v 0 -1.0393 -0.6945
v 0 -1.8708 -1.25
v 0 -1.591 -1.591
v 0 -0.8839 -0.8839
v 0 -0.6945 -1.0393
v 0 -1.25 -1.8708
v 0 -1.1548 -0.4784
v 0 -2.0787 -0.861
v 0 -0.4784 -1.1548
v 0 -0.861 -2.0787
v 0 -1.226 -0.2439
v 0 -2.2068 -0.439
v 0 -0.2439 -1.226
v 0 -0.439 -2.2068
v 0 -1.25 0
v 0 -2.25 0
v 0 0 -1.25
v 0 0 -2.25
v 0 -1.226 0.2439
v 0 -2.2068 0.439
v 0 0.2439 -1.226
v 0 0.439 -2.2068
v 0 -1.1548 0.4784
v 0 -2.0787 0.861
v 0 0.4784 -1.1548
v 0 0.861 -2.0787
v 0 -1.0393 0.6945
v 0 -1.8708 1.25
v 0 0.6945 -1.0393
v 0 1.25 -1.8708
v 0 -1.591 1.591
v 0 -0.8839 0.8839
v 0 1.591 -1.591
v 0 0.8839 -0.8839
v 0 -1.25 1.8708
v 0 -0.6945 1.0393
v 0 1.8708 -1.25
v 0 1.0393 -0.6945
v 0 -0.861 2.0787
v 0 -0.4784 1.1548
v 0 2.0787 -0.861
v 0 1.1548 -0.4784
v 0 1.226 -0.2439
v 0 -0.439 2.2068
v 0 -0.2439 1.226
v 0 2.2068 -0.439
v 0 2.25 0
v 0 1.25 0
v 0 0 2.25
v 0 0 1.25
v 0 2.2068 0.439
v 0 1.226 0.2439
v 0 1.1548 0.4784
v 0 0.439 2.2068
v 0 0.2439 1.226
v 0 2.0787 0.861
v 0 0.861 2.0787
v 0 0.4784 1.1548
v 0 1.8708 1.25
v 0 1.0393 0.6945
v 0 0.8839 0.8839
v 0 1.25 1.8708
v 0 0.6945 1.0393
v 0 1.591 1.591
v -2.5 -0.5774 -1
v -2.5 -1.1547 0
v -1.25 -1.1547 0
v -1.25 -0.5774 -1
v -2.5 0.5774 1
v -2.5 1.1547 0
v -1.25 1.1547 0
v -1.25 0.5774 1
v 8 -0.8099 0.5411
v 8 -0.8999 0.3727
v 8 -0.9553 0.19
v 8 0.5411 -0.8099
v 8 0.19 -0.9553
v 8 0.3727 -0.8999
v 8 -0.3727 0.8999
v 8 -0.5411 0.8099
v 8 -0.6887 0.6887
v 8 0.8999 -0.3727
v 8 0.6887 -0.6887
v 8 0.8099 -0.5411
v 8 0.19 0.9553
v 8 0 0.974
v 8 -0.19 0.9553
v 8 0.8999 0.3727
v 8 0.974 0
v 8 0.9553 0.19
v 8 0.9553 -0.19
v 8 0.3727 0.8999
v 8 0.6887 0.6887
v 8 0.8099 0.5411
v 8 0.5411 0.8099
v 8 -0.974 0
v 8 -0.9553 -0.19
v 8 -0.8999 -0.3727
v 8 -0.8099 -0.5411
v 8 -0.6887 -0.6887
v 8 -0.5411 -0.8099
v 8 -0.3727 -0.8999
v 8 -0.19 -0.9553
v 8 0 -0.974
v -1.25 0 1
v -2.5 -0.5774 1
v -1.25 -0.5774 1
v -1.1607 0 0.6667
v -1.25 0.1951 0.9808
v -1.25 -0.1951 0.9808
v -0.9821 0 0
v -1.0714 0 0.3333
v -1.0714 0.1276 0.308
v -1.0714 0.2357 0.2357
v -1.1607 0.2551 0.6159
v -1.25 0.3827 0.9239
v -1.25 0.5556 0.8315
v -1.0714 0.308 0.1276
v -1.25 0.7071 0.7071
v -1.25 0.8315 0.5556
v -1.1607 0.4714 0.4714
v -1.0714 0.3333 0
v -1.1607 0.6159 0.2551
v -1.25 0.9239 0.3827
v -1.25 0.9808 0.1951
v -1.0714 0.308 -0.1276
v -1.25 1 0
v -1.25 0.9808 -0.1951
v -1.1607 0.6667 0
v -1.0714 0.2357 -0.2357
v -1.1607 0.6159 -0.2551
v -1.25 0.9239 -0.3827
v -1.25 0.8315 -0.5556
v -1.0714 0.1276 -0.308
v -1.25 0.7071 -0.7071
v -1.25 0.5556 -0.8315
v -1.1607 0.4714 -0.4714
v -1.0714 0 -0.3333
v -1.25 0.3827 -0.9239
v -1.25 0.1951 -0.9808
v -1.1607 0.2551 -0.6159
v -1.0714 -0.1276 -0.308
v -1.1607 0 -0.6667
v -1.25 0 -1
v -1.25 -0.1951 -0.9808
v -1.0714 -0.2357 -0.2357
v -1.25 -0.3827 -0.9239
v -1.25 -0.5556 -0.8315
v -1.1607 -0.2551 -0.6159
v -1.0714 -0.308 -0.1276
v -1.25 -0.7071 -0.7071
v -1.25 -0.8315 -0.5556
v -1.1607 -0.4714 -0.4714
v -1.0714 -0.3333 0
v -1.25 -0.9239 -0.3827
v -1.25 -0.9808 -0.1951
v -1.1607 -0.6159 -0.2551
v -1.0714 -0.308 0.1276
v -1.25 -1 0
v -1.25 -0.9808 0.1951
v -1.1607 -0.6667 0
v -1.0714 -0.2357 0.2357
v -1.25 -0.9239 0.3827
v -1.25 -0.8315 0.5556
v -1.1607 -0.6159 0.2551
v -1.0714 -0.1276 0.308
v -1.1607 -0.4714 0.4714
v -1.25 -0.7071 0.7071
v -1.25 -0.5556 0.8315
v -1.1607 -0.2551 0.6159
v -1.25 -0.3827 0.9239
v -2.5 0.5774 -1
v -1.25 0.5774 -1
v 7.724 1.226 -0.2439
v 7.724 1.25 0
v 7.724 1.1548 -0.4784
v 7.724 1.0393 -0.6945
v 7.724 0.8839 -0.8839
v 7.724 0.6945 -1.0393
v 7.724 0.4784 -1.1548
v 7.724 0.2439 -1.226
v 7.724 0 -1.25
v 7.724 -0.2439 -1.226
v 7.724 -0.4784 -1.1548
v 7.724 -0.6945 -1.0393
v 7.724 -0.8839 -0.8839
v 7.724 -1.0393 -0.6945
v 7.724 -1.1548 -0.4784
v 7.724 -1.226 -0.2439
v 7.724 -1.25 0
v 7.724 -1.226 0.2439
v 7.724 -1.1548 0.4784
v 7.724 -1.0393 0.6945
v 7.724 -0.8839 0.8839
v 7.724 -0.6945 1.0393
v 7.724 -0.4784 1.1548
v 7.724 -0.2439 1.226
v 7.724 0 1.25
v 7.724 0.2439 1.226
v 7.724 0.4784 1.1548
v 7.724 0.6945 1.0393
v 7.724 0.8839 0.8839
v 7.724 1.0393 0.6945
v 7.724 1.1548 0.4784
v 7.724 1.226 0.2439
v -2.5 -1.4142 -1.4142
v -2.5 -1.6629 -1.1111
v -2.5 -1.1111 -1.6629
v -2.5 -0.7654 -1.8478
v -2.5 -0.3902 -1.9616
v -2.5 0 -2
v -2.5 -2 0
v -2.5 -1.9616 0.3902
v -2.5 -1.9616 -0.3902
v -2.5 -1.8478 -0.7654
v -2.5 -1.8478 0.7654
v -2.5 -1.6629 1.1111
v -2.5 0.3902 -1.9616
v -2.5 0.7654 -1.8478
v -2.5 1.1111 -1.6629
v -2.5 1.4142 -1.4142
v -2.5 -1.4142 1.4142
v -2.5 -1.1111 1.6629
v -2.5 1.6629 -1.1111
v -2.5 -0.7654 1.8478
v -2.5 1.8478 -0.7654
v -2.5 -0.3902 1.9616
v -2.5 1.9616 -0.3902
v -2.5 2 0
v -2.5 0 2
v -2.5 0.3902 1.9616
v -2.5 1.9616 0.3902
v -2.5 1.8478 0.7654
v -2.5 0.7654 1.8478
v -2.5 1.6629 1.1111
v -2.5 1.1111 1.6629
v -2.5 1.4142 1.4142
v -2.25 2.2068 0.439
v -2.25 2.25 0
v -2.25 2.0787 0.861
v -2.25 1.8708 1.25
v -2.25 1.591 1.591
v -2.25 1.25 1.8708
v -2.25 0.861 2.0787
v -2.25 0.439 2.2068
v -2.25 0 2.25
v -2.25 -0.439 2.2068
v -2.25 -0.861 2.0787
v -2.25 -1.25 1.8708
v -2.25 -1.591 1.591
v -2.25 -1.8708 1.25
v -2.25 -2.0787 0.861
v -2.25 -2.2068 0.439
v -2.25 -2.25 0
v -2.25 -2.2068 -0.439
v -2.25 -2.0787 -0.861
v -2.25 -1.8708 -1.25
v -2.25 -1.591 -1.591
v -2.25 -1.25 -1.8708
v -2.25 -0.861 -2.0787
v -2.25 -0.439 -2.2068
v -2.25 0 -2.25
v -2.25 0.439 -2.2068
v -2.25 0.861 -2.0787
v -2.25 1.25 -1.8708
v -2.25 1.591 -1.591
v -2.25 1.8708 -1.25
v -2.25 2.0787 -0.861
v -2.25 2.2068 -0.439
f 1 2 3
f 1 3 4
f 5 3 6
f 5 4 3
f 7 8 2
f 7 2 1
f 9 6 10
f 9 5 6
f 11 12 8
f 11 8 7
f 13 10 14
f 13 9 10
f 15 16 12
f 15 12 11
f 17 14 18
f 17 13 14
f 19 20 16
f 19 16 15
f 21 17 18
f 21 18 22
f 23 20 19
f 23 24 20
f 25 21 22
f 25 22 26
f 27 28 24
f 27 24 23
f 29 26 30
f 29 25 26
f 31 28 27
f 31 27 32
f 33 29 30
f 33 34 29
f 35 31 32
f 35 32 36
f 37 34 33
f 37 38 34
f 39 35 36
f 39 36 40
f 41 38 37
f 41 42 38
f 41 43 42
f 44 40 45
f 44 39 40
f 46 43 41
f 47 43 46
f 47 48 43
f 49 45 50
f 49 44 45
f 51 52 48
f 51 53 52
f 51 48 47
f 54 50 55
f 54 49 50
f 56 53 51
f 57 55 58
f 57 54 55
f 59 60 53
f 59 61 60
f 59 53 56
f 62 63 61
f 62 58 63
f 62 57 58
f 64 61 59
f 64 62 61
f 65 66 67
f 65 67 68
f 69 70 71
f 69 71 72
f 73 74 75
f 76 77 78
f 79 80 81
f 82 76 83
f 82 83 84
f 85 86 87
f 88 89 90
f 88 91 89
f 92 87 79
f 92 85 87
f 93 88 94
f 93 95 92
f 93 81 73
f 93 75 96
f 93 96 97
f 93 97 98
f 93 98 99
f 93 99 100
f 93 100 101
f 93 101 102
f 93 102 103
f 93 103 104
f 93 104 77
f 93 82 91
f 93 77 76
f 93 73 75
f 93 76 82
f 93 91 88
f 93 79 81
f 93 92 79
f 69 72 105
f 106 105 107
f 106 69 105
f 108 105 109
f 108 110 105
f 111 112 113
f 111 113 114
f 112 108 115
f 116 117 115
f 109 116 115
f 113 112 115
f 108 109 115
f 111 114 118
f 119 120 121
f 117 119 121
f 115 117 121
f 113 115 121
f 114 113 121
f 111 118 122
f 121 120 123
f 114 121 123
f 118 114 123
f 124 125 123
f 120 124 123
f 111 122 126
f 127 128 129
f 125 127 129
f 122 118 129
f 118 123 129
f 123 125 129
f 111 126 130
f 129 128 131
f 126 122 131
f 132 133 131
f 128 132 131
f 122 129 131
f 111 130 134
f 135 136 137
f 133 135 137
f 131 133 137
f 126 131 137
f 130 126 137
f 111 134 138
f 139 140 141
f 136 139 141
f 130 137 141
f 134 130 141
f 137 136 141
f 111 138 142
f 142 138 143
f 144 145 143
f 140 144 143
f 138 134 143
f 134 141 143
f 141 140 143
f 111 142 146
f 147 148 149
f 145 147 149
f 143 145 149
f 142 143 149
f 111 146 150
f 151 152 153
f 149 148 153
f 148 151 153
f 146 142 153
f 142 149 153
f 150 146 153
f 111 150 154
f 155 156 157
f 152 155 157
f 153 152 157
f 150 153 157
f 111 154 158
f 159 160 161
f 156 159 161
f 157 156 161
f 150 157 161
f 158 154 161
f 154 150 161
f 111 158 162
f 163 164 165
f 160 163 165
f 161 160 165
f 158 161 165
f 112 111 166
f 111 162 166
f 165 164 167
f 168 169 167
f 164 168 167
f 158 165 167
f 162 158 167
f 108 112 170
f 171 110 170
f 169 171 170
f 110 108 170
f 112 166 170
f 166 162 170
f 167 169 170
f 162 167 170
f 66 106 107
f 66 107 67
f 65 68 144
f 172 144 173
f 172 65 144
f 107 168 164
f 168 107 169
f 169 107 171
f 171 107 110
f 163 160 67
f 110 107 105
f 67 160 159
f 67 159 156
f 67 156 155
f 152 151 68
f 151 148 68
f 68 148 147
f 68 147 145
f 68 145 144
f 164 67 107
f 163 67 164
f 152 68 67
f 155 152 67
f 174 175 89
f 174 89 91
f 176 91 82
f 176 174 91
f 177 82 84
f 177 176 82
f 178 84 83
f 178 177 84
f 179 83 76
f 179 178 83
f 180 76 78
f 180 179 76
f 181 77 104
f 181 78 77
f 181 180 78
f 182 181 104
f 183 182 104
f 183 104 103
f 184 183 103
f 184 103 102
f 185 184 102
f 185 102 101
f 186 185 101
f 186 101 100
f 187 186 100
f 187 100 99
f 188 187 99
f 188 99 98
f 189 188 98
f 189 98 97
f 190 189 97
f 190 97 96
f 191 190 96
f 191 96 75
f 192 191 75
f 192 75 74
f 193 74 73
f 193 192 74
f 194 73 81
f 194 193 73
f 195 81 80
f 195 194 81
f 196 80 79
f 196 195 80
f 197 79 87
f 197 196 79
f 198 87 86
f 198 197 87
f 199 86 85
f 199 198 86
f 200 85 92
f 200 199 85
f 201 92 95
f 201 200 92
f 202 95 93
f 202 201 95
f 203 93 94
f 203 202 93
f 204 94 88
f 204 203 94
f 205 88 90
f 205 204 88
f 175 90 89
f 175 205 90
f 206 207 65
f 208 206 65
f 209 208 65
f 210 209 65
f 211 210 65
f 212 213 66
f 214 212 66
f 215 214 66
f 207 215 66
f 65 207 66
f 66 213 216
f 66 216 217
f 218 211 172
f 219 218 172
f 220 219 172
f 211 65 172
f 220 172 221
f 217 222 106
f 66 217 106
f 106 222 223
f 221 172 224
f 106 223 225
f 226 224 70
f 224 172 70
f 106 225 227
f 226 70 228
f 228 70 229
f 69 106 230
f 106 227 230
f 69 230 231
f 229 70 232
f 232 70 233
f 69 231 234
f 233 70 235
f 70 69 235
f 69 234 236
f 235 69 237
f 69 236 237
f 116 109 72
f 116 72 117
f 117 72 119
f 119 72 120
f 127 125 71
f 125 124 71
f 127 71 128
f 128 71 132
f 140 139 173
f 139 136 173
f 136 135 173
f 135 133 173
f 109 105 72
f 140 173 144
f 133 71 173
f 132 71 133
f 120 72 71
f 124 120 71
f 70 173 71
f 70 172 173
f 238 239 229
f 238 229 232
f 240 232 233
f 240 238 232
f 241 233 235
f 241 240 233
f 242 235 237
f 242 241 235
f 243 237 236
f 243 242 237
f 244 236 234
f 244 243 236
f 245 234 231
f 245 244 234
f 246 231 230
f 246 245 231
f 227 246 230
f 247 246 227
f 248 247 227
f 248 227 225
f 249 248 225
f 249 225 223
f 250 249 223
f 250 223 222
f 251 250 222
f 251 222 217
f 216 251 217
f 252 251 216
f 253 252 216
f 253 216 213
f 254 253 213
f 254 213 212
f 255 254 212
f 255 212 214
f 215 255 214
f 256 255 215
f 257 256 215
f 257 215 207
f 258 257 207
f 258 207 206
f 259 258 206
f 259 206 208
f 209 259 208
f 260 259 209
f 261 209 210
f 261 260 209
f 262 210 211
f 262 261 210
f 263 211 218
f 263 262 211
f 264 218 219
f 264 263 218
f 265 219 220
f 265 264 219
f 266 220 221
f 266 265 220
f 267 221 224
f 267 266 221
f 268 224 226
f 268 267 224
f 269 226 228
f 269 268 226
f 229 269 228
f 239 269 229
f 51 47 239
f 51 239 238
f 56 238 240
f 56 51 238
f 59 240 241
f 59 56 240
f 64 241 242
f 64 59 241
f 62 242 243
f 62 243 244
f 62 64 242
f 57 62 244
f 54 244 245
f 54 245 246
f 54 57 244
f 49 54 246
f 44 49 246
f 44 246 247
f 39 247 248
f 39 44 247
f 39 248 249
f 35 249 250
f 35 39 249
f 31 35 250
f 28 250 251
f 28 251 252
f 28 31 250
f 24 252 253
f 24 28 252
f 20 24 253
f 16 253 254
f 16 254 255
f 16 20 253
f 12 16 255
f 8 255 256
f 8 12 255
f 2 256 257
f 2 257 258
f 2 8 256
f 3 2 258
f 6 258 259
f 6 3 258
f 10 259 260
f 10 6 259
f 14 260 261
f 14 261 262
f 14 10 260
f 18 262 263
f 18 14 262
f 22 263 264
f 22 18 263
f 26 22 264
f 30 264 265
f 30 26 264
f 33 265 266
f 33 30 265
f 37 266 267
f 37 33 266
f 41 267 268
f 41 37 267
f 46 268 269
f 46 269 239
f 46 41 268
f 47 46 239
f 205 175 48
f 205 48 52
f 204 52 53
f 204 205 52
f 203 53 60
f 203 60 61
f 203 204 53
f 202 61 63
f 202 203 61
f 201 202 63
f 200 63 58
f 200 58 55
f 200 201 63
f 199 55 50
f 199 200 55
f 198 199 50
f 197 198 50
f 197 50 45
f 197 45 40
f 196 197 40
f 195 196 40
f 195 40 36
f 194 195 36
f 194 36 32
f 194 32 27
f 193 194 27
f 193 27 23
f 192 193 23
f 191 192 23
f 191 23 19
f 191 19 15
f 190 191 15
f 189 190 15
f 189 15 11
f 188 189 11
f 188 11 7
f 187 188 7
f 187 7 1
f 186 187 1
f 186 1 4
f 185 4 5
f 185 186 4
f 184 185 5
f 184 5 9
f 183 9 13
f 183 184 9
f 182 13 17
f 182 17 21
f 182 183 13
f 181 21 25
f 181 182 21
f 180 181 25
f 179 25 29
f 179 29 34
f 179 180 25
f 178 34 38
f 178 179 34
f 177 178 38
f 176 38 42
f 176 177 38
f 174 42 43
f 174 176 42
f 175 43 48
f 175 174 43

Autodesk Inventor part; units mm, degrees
sketch "Sketch_1" plane through (0, 0, 0) normal (0, 0, 1) x (1, 0, 0)
  line L0 (8, 0) -> (-2.5, 0)
  line L1 (-2.5, 0) -> (-2.5, 2)
  line L2 (-2.5, 2) -> (-2.25, 2.25)
  line L3 (-2.25, 2.25) -> (0, 2.25)
  line L4 (0, 2.25) -> (0, 1.25)
  line L5 (0, 1.25) -> (7.724, 1.25)
  line L6 (7.724, 1.25) -> (8, 0.974)
  line L7 (8, 0.974) -> (8, 0)
  line L8 (8, 0) -> (-2.5, 0)
revolve "Revolution1" add sketch "Sketch_1" angle 360 about axis through (8, 0, 0) along (1, 0, 0)
thread "Thread1" size "M2.5x0.45" class "6g" standard "ISO Metric profile" length 6.724
sketch "Sketch2" plane through (-2.5, 0, 0) normal (-1, 0, 0) x (0, 0, 1)
  point P0 (0, 0)
hole "Hole1" at (-2.5, 0, 0) direction (1, 0, 0) diameter 2 depth 1.25 tip angle 150
sketch "Sketch_3" plane through (-2.5, 0, 0) normal (1, 0, 0) x (0, 0, -1)
  line L0 (-1, -0.5774) -> (0, -1.1547)
  line L1 (0, -1.1547) -> (1, -0.5774)
  line L2 (1, -0.5774) -> (1, 0.5774)
  line L3 (1, 0.5774) -> (0, 1.1547)
  line L4 (0, 1.1547) -> (-1, 0.5774)
  line L5 (-1, 0.5774) -> (-1, -0.5774)
extrude "Extrusion1" cut sketch "Sketch_3" along normal blind 1.25
ref_plane "bolt_to_nut_XY" through (8, 0, 0) normal (1, 0, 0) x (0, 0, -1)
ref_plane "bolt_to_nut_YZ" through (8, 0, 0) normal (0, 0, -1) x (0, 1, 0)
ref_plane "bolt_to_nut_ZX" through (8, 0, 0) normal (0, 1, 0) x (1, 0, 0)
ref_plane "screw1_XY" through (0, 0, 0) normal (1, 0, 0) x (0, 0, -1)
ref_plane "screw1_YZ" through (0, 0, 0) normal (0, 0, -1) x (0, 1, 0)
ref_plane "screw1_ZX" through (0, 0, 0) normal (0, 1, 0) x (1, 0, 0)
properties part number "CB2_5-8" material "鋼、炭素鋼"
